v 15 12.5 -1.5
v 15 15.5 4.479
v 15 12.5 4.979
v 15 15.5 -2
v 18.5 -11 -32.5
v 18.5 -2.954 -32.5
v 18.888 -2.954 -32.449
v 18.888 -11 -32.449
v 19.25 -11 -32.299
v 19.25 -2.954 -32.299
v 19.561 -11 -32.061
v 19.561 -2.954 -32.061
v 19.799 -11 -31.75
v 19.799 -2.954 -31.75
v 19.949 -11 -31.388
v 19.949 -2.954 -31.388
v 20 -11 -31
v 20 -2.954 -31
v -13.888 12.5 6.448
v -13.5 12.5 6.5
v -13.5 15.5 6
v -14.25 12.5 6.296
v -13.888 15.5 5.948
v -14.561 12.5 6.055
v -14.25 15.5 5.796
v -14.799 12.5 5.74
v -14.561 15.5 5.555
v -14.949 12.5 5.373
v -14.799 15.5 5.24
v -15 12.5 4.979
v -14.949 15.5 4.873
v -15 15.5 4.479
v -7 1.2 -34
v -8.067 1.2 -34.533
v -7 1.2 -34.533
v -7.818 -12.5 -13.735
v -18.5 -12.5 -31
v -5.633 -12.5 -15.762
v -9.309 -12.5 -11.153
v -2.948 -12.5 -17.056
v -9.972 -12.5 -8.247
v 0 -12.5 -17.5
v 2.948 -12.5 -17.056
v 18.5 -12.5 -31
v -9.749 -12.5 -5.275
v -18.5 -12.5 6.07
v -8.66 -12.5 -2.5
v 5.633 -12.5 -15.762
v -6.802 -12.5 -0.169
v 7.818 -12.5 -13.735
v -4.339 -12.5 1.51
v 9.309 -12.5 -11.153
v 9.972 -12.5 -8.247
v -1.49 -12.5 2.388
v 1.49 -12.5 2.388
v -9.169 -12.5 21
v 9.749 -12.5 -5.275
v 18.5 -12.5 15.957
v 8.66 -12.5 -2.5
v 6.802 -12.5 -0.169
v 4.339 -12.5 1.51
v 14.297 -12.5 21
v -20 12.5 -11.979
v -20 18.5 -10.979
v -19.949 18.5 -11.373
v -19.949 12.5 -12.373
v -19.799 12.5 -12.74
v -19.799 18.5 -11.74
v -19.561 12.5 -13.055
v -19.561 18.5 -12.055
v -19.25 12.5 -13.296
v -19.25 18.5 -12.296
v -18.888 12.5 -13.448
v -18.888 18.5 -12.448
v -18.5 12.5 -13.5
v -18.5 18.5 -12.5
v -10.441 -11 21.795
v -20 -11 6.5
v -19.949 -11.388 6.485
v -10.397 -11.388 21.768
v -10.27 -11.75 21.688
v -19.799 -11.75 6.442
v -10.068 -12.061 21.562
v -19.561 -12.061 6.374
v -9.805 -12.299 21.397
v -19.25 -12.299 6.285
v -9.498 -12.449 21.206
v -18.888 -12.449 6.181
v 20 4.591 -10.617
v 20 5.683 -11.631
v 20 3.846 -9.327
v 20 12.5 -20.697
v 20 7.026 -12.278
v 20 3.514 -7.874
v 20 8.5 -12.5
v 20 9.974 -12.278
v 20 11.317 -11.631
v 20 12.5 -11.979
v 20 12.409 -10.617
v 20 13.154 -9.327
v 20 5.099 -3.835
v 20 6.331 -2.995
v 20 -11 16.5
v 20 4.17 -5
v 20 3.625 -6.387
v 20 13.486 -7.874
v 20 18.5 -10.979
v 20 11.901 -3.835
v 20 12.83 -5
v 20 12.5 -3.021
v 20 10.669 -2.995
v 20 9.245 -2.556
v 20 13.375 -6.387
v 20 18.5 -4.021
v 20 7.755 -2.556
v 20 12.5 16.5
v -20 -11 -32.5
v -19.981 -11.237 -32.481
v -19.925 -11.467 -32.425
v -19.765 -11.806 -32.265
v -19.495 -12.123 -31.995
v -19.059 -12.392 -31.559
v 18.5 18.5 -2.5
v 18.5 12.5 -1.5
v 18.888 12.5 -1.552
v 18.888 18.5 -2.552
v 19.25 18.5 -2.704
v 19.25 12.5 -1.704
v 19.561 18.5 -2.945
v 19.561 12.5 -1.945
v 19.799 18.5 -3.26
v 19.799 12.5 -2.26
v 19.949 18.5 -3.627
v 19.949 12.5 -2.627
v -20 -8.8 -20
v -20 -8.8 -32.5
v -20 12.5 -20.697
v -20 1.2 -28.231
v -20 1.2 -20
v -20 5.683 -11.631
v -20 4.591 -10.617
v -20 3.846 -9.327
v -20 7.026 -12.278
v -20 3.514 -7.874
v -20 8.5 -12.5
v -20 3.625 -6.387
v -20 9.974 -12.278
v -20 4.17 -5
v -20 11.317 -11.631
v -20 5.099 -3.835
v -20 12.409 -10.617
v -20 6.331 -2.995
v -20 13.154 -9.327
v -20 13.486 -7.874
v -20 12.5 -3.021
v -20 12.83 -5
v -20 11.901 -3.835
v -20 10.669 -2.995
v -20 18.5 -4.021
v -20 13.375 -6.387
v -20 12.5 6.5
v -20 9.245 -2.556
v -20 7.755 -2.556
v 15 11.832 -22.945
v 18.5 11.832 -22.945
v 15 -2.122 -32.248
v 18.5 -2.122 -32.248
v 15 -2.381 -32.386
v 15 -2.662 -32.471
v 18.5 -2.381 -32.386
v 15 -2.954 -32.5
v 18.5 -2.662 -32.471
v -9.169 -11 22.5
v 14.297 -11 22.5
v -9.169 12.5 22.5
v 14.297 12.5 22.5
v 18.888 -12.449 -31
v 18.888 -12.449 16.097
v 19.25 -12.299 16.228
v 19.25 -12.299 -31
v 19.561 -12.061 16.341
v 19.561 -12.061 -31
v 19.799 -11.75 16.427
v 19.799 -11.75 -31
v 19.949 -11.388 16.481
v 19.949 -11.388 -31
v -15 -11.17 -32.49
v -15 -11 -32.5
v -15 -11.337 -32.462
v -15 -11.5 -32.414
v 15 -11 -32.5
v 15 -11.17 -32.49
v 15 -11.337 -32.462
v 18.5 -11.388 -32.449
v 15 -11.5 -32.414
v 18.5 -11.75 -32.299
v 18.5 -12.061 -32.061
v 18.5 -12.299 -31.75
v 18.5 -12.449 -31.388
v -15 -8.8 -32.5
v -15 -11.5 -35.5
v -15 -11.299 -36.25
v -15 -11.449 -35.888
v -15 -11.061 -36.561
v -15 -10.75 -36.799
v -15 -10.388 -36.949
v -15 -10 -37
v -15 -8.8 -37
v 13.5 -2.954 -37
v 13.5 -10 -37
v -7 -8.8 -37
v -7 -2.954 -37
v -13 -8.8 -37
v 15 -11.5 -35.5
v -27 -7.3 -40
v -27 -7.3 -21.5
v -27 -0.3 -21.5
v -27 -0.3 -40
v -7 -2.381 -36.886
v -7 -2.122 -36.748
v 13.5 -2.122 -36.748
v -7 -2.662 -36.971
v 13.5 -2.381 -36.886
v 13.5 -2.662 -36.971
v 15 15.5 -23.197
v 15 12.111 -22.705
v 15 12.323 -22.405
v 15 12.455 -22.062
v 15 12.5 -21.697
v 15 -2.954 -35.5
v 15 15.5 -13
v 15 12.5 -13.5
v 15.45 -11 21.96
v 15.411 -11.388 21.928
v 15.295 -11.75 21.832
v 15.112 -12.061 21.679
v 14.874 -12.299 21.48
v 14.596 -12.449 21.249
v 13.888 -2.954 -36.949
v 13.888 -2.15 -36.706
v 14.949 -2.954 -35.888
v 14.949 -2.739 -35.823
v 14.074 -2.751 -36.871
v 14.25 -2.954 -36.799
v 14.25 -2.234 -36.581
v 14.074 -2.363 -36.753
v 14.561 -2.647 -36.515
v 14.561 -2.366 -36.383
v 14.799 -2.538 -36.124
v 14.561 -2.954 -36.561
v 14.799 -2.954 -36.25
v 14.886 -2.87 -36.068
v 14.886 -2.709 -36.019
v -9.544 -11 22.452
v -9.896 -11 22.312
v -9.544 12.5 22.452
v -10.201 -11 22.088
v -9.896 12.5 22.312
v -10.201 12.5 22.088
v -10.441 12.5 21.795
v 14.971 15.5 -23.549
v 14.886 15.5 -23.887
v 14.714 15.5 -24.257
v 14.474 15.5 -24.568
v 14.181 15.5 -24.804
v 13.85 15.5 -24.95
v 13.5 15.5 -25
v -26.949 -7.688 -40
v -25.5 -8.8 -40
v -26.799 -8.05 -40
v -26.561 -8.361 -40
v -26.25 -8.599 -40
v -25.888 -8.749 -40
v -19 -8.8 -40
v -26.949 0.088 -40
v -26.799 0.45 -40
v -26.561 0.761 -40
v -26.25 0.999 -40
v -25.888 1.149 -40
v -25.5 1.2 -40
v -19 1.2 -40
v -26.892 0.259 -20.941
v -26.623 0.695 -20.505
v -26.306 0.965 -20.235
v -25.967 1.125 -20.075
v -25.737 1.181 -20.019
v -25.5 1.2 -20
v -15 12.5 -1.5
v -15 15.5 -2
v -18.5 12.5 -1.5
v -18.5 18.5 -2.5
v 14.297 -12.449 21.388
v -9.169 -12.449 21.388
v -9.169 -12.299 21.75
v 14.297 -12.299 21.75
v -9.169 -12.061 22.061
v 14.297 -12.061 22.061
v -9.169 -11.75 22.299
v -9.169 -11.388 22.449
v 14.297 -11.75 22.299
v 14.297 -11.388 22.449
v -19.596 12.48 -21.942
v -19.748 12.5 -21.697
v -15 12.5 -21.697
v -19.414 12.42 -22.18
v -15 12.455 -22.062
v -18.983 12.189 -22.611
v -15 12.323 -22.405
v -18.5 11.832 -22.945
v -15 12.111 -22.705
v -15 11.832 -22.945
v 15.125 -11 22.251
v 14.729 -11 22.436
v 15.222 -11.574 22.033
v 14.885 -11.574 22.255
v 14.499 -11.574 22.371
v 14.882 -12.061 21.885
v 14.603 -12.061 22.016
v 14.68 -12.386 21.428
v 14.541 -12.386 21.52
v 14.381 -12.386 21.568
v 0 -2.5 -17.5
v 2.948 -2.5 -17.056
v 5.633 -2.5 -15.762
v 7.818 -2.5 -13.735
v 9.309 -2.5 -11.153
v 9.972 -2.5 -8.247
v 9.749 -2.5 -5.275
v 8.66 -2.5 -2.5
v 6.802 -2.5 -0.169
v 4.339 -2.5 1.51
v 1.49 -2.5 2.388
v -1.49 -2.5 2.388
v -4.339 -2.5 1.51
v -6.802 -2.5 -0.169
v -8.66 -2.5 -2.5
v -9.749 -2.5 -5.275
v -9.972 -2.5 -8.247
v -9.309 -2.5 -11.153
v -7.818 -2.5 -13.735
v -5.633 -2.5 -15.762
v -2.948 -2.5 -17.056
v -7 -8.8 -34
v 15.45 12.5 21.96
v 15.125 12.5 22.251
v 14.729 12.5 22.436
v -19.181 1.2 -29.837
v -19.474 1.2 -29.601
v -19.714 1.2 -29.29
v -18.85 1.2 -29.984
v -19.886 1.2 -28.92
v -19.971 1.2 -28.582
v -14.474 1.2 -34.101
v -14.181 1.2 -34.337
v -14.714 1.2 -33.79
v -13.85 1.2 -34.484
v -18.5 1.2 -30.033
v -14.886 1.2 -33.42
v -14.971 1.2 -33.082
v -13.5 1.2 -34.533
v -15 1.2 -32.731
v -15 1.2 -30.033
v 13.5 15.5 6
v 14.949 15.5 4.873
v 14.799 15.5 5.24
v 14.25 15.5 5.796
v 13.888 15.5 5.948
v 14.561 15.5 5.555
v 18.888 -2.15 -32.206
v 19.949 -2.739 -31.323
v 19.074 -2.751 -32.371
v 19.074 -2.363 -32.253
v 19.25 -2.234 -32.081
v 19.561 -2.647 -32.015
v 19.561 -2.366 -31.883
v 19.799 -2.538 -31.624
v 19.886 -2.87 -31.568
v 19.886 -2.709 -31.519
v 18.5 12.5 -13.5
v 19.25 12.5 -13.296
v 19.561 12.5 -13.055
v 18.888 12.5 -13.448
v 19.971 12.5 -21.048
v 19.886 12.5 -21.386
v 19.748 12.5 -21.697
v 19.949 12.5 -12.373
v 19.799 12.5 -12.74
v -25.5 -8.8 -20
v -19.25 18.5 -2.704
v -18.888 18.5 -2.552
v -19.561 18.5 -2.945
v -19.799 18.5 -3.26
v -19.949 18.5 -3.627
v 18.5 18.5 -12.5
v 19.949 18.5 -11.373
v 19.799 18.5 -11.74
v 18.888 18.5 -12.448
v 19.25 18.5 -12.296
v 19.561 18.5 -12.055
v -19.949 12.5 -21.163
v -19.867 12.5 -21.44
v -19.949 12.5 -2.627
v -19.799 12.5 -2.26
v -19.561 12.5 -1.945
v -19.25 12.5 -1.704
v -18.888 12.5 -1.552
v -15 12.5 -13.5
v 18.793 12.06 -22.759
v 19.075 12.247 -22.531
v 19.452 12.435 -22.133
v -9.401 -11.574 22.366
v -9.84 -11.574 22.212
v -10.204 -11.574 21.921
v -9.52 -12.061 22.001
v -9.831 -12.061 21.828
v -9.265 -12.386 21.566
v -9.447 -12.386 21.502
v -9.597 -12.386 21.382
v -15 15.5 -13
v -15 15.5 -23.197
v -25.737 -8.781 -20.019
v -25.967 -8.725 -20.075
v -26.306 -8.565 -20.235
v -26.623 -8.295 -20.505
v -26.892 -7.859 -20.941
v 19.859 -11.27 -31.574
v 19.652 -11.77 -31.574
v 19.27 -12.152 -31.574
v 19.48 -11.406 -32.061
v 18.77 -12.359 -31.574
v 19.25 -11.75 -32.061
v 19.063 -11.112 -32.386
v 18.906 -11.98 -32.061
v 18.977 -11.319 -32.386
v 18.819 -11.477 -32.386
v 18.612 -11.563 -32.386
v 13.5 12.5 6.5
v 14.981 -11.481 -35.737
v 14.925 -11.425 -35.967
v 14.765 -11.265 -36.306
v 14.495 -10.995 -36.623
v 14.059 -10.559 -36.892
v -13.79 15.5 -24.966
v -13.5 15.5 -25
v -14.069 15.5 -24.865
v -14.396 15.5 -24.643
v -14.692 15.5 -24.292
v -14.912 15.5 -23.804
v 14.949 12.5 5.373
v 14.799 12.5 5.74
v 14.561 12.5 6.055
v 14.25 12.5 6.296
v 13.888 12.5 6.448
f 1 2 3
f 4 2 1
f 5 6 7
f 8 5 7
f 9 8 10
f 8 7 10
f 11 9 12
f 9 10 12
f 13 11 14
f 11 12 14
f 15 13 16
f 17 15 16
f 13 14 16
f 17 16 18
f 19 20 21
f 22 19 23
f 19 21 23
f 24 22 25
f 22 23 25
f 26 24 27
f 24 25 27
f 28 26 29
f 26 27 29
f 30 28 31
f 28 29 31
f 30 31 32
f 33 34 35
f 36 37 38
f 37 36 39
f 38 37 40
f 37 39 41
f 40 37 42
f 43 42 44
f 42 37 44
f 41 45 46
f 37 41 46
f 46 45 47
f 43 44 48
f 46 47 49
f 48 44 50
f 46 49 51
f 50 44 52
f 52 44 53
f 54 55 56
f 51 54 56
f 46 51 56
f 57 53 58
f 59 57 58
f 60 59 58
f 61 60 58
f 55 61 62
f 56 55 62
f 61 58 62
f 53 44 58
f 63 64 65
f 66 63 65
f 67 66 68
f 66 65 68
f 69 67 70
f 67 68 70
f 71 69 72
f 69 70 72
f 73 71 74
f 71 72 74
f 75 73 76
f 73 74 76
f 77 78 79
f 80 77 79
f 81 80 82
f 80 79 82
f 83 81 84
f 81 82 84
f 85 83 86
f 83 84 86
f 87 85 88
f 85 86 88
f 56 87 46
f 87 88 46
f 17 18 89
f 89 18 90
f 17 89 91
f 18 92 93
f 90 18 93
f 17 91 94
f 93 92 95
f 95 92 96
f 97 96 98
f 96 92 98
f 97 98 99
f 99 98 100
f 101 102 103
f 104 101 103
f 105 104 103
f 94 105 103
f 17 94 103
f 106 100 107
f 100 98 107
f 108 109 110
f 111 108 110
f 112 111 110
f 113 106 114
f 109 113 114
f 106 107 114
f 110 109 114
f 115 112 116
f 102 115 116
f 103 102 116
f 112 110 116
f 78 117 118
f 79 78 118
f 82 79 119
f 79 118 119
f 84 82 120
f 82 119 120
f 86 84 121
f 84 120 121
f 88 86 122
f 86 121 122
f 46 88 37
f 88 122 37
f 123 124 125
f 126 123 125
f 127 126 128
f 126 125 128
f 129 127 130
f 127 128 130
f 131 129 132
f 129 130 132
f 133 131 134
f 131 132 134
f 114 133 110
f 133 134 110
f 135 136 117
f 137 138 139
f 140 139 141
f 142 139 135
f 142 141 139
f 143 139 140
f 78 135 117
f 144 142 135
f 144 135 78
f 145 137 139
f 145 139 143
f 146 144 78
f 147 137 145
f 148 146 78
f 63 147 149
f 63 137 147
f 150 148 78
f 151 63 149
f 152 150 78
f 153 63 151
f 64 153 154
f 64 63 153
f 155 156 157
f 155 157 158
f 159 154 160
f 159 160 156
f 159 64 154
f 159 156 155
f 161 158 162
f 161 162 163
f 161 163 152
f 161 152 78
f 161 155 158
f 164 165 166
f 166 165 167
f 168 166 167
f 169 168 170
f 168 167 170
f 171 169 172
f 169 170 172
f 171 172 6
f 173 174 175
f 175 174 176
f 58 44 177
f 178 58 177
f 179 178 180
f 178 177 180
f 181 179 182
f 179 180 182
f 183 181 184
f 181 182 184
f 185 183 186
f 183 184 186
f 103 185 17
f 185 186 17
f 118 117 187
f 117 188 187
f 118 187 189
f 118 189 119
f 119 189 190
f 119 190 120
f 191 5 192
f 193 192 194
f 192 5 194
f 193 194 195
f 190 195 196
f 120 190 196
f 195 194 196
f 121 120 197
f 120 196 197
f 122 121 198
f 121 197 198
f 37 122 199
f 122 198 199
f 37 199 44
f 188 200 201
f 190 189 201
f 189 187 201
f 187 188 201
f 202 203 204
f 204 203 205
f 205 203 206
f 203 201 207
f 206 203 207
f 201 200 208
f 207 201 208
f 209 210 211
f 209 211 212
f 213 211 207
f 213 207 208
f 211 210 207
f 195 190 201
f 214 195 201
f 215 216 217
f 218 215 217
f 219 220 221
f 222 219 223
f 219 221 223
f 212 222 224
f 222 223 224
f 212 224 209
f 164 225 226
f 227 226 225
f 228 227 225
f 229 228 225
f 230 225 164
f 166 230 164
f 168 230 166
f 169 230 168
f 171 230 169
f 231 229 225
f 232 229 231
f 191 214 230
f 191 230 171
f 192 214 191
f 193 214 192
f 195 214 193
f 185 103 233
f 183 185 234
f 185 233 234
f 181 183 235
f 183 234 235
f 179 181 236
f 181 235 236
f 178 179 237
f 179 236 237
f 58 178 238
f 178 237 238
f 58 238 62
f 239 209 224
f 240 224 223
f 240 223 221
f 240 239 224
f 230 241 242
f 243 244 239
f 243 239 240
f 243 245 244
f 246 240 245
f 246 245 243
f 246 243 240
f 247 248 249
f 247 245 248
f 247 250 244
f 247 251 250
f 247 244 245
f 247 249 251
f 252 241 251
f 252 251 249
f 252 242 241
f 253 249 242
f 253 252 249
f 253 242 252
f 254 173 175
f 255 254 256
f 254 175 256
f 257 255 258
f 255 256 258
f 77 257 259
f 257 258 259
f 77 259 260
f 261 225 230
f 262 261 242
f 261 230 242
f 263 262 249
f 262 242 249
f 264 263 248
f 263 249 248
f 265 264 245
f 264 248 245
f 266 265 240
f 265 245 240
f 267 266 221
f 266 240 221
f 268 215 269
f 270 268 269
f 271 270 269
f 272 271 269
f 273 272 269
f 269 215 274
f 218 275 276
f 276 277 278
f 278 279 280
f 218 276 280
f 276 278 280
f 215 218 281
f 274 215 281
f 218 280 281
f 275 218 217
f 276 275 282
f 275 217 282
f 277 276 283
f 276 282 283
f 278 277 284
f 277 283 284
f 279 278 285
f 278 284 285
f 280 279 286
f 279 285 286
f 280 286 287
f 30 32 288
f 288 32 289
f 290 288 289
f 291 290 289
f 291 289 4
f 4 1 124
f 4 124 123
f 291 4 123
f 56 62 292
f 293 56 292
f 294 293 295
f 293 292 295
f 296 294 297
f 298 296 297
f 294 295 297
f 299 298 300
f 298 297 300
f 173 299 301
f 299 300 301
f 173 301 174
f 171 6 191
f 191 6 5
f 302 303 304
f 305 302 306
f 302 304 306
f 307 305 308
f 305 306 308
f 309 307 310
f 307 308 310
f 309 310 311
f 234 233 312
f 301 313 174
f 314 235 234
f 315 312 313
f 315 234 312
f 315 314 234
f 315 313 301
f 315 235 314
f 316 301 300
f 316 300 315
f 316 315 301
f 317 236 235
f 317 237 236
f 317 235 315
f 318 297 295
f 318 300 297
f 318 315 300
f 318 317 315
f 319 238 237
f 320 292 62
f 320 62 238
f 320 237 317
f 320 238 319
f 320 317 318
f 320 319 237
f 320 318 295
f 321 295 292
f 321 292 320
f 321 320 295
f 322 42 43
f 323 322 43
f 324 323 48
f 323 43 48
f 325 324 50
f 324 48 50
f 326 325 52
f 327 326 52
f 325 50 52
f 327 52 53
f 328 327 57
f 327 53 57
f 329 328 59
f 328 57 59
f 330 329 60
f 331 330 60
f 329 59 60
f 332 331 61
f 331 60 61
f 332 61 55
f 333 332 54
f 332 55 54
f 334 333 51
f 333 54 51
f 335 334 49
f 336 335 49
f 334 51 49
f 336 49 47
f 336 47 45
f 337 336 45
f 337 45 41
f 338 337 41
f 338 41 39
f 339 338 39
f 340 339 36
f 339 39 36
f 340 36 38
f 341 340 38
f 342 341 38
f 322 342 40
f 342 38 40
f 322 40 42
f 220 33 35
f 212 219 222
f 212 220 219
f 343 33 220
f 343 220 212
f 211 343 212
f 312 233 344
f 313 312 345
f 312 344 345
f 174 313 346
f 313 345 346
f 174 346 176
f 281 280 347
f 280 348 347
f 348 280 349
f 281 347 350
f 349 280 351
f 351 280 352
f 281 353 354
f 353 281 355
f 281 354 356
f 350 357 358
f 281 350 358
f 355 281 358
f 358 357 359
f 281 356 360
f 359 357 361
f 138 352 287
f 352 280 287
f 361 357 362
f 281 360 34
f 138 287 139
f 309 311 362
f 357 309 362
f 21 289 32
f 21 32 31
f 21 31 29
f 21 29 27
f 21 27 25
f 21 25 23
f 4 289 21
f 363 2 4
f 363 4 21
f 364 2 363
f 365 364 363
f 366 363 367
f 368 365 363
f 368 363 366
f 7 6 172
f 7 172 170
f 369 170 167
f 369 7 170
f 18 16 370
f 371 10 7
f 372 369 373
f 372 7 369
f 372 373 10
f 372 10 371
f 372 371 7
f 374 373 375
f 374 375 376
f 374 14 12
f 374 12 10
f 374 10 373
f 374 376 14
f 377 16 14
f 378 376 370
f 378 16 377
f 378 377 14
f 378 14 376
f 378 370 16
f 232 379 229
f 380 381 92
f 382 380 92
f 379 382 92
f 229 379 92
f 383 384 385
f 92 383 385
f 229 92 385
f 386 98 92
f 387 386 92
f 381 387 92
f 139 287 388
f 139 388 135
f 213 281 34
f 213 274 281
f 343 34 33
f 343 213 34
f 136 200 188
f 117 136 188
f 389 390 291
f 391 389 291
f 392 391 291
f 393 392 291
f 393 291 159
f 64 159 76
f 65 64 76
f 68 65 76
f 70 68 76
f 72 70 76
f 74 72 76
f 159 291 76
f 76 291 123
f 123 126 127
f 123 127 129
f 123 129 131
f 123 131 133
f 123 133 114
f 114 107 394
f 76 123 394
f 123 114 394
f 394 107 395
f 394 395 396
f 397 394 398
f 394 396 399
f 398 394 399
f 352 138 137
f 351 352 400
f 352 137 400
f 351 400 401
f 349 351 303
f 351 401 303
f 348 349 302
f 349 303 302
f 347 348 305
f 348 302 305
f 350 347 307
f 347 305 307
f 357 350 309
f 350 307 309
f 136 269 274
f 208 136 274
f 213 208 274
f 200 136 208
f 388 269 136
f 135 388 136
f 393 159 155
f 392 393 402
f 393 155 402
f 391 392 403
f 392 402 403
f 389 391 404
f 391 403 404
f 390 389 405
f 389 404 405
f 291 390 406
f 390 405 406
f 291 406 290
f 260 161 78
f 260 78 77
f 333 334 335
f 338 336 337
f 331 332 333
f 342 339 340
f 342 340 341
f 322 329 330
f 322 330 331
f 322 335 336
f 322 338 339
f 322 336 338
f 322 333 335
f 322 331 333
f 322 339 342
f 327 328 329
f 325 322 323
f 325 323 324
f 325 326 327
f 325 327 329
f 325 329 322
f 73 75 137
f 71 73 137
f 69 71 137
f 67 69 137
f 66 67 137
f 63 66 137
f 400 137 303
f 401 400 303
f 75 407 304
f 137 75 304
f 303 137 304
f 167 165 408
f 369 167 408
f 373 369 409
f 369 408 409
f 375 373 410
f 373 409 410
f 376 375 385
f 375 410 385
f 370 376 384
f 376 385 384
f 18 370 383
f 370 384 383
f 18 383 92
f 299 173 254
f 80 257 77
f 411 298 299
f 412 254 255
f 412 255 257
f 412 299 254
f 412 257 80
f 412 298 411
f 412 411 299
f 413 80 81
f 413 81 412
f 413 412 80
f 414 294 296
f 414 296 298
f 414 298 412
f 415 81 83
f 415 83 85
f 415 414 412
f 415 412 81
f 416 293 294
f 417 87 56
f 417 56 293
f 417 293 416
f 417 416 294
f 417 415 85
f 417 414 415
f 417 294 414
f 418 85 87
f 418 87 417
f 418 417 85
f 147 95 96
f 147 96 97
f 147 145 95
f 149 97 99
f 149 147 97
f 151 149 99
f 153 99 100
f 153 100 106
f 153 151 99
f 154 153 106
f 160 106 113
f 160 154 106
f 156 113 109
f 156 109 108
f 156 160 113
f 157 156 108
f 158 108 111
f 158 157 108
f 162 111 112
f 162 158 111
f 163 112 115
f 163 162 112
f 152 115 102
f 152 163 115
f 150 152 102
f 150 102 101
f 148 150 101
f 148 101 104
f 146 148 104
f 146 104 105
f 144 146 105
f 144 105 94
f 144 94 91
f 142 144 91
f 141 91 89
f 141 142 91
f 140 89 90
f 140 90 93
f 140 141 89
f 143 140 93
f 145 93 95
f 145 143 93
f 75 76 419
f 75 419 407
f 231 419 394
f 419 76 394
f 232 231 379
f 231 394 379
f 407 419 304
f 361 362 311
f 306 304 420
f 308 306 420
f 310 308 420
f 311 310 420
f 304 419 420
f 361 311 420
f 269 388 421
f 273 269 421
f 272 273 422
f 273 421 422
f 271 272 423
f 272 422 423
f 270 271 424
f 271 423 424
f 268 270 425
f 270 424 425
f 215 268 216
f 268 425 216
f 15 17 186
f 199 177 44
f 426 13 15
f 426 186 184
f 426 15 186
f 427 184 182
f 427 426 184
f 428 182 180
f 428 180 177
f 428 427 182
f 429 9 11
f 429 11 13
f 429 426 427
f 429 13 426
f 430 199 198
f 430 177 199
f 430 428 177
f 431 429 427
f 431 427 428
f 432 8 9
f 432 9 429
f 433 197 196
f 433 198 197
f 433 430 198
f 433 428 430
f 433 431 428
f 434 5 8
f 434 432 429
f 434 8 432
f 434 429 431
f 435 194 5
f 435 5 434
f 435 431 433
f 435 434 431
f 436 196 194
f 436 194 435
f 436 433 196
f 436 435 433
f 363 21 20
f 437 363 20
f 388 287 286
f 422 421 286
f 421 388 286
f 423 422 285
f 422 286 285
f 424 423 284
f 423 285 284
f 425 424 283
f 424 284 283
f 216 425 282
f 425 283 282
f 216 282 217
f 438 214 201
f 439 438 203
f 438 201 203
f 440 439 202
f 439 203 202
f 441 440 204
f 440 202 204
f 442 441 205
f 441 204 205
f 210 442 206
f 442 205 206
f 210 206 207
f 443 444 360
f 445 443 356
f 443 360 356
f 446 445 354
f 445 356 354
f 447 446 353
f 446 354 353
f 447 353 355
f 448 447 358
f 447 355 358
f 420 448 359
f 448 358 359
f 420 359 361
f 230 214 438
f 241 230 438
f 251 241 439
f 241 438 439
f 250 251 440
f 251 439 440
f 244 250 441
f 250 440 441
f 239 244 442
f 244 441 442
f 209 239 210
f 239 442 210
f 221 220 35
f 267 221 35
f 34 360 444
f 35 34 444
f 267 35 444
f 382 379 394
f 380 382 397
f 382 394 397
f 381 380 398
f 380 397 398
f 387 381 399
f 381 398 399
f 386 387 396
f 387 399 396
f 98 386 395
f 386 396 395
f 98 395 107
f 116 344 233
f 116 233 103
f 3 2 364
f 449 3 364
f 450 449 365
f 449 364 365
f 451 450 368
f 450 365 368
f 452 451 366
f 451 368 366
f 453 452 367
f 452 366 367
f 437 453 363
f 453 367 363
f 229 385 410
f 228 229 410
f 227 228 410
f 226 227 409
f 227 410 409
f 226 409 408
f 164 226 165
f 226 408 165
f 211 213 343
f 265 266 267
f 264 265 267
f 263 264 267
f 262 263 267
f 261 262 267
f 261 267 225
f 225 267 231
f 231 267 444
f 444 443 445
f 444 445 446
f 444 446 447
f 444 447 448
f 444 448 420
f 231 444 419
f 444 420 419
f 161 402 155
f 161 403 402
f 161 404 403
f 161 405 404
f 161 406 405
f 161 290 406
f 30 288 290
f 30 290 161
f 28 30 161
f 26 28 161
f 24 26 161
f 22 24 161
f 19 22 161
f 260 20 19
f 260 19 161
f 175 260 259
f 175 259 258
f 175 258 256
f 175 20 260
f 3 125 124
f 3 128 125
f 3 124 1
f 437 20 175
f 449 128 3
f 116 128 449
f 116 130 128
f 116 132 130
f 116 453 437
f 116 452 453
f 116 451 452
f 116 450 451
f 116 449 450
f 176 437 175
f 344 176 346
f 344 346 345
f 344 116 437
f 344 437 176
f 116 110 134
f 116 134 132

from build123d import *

# Parameters (mm, degrees)
SKETCH1_R           = 5
BOSS_EXTRUDE1_DEPTH = 20
BOSS_EXTRUDE2_DEPTH = 15
CUT_EXTRUDE2_DEPTH  = 49.928519291
BOSS_EXTRUDE3_START = -20
SKETCH4_W           = 20
SKETCH4_H           = 10
BOSS_EXTRUDE3_DEPTH = 20
CUT_EXTRUDE3_DEPTH  = 5
SKETCH2_R           = 10
CUT_EXTRUDE1_DEPTH  = 10
FILLET1_R           = 1.5


with BuildPart() as part:
    # Sketch1 → Boss-Extrude1 (new, symmetric)
    with BuildSketch(Plane(origin=(0, 0, 0), x_dir=(0, 0, -1), z_dir=(1, 0, 0))):
        Polygon((13.5, 12.5), (22.5, 12.5), (32.5, -2.5), (32.5, -12.5), (-22.5, -12.5), (-22.5, 12.5), (1.5, 12.5), (2.5, 18.5), (12.5, 18.5), align=None)
        with Locations((7.5, 8.5)):
            Circle(SKETCH1_R, mode=Mode.SUBTRACT)
    extrude(amount=BOSS_EXTRUDE1_DEPTH, both=True)

    # Sketch1<3> → Boss-Extrude2 (add, symmetric)
    with BuildSketch(Plane(origin=(0, 0, 0), x_dir=(0, 0, -1), z_dir=(1, 0, 0))):
        Polygon((13.5, 12.5), (22.5, 12.5), (32.5, -2.5), (32.5, -11.5), (37, -11.5), (37, -2.5), (25, 15.5), (13, 15.5), align=None)
        Polygon((1.5, 12.5), (2, 15.5), (-6, 15.5), (-6.5, 12.5), align=None)
    extrude(amount=BOSS_EXTRUDE2_DEPTH, both=True)

    # Sketch3 → Cut-Extrude2 (cut, through all)
    with BuildSketch(Plane(origin=(0, 12.5, 0), x_dir=(1, 0, 0), z_dir=(0, 1, 0))):
        Polygon((15, -22.5), (20, -16.5), (20, -22.5), align=None)
        Polygon((-10, -22.5), (-20, -22.5), (-20, -6.5), align=None)
    extrude(amount=-CUT_EXTRUDE2_DEPTH, mode=Mode.SUBTRACT)

    # Sketch4 → Boss-Extrude3 (add)
    with BuildSketch(Plane.XY.offset(BOSS_EXTRUDE3_START)):
        with Locations((-17, -3.8)):
            Rectangle(SKETCH4_W, SKETCH4_H)
    extrude(amount=-BOSS_EXTRUDE3_DEPTH)

    # Sketch5 → Cut-Extrude3 (cut, symmetric)
    with BuildSketch(Plane(origin=(0, -3.8, 0), x_dir=(-1, 0, 0), z_dir=(0, -1, 0))):
        Polygon((7, 40), (19, 40), (7, 34), align=None)
    extrude(amount=CUT_EXTRUDE3_DEPTH, both=True, mode=Mode.SUBTRACT)

    # Sketch2 → Cut-Extrude1 (cut)
    with BuildSketch(Plane.XZ.offset(12.5)):
        with Locations(Location((0, -7.5, 0), (0, 0, 270))):
            Circle(SKETCH2_R)
    extrude(amount=-CUT_EXTRUDE1_DEPTH, mode=Mode.SUBTRACT)

    # Fillet1
    # the kernel refuses this fillet: 1.5 mm, written as the material it takes off along each edge
    with BuildSketch(Plane(origin=(-9.168628538, -11, 21), x_dir=(0, 0, 1), z_dir=(0, -1, 0))) as fillet1_piece_1_section:
        Polygon((0, 0), (FILLET1_R, 0), (FILLET1_R, FILLET1_R * 0.554247641507), (FILLET1_R * 0.529998940003, FILLET1_R * 0.847998304005), align=None)
    fillet1_piece_1 = extrude(amount=FILLET1_R, mode=Mode.PRIVATE)
    fillet1_piece_1 = fillet1_piece_1 - Plane(origin=(-9.168628538, -11, 21), x_dir=(0.4847685323929452, 0, -0.8746424812468178), z_dir=(0, -1, 0)) * Sphere(FILLET1_R, mode=Mode.PRIVATE)
    add(fillet1_piece_1, mode=Mode.SUBTRACT)
    with BuildSketch(Plane(origin=(18.5, -2.954163457, -31), x_dir=(0, 0, -1), z_dir=(1, 0, 0))) as fillet1_piece_2_section:
        Polygon((0, 0), (FILLET1_R, 0), (FILLET1_R, FILLET1_R * 0.302775637732), (FILLET1_R * 0.832050294338, FILLET1_R * 0.554700196225), align=None)
    fillet1_piece_2 = extrude(amount=FILLET1_R, mode=Mode.PRIVATE)
    fillet1_piece_2 = fillet1_piece_2 - Plane(origin=(18.5, -2.954163457, -31), x_dir=(0, -0.2897841486884299, 0.9570920264890529), z_dir=(1, 0, 0)) * Sphere(FILLET1_R, mode=Mode.PRIVATE)
    add(fillet1_piece_2, mode=Mode.SUBTRACT)
    with BuildSketch(Plane(origin=(18.5, -11, -31), x_dir=(1, 0, 0), z_dir=(0, 0, -1))) as fillet1_piece_3_section:
        Polygon((0, 0), (FILLET1_R, 0), (FILLET1_R, FILLET1_R), (0, FILLET1_R), align=None)
    fillet1_piece_3 = extrude(amount=FILLET1_R, mode=Mode.PRIVATE)
    fillet1_piece_3 = fillet1_piece_3 - Plane(origin=(18.5, -11, -31), x_dir=(-0.7071067811865475, 0.7071067811865475, 0), z_dir=(0, 0, -1)) * Sphere(FILLET1_R, mode=Mode.PRIVATE)
    add(fillet1_piece_3, mode=Mode.SUBTRACT)
    with BuildSketch(Plane(origin=(13.5, -2.954163457, -35.5), x_dir=(0, 0.5547001962252297, -0.8320502943378434), z_dir=(1, 0, 0))) as fillet1_piece_4_section:
        Polygon((0, 0), (FILLET1_R, 0), (FILLET1_R, -FILLET1_R * 0.302775637732), (FILLET1_R * 0.832050294338, -FILLET1_R * 0.554700196225), align=None)
    fillet1_piece_4 = extrude(amount=FILLET1_R, mode=Mode.PRIVATE)
    fillet1_piece_4 = fillet1_piece_4 - Plane(origin=(13.5, -2.954163457, -35.5), x_dir=(0, -0.2897841486884304, 0.9570920264890528), z_dir=(1, 0, 0)) * Sphere(FILLET1_R, mode=Mode.PRIVATE)
    add(fillet1_piece_4, mode=Mode.SUBTRACT)
    with BuildSketch(Plane(origin=(14.297437581, -11, 21), x_dir=(0, 0, 1), z_dir=(0, -1, 0))) as fillet1_piece_5_section:
        Polygon((0, 0), (FILLET1_R, 0), (FILLET1_R, -FILLET1_R * 0.468374945984), (FILLET1_R * 0.640184399664, -FILLET1_R * 0.768221279597), align=None)
    fillet1_piece_5 = extrude(amount=FILLET1_R, mode=Mode.PRIVATE)
    fillet1_piece_5 = fillet1_piece_5 - Plane(origin=(14.297437581, -11, 21), x_dir=(-0.42415539624972376, 0, -0.90558942122368), z_dir=(0, -1, 0)) * Sphere(FILLET1_R, mode=Mode.PRIVATE)
    add(fillet1_piece_5, mode=Mode.SUBTRACT)
    with BuildSketch(Plane(origin=(-10, 14.578428656, 22.5), x_dir=(-0.5299989400031788, 0, -0.8479983040050887), z_dir=(0, -1, 0))) as fillet1_piece_6:
        with BuildLine():
            CenterArc((FILLET1_R * 0.554247641507, FILLET1_R), FILLET1_R, 212.005383208, 57.994616792)
            Line((-FILLET1_R * 0.293750662498, FILLET1_R * 0.470001059997), (0, 0))
            Line((0, 0), (FILLET1_R * 0.554247641507, 0))
        make_face()
    extrude(amount=25.578428656, mode=Mode.SUBTRACT)
    with BuildSketch(Plane(origin=(20, -2.954163457, -32.5), x_dir=(0, 0, 1), z_dir=(0, -1, 0))) as fillet1_piece_7:
        with BuildLine():
            CenterArc((FILLET1_R, FILLET1_R), FILLET1_R, 180, 90)
            Line((0, FILLET1_R), (0, 0))
            Line((0, 0), (FILLET1_R, 0))
        make_face()
    extrude(amount=8.045836543, mode=Mode.SUBTRACT)
    with BuildSketch(Plane(origin=(15, -15.25, -37), x_dir=(0, 0, 1), z_dir=(0, 1, 0))) as fillet1_piece_8:
        with BuildLine():
            CenterArc((FILLET1_R, -FILLET1_R), FILLET1_R, 90, 90)
            Line((0, -FILLET1_R), (0, 0))
            Line((0, 0), (FILLET1_R, 0))
        make_face()
    extrude(amount=12.295836543, mode=Mode.SUBTRACT)
    with BuildSketch(Plane(origin=(13.5, -2.5, -37), x_dir=(0, 0.8320502943378404, 0.5547001962252341), z_dir=(-1, 0, 0))) as fillet1_piece_9:
        with BuildLine():
            CenterArc((FILLET1_R * 0.302775637732, -FILLET1_R), FILLET1_R, 90, 33.690067526)
            Line((-FILLET1_R * 0.251924558493, -FILLET1_R * 0.167949705662), (0, 0))
            Line((0, 0), (FILLET1_R * 0.302775637732, 0))
        make_face()
    extrude(amount=21.635408641, mode=Mode.SUBTRACT)
    with BuildSketch(Plane(origin=(-15, -1.920188604, -36.613459069), x_dir=(0, -0.5547001962252296, 0.8320502943378434), z_dir=(0, 0.8320502943378434, 0.5547001962252297))) as fillet1_piece_10_section:
        with BuildLine():
            CenterArc((FILLET1_R, FILLET1_R), FILLET1_R, 180, 90)
            Line((0, FILLET1_R), (0, 0))
            Line((0, 0), (FILLET1_R, 0))
        make_face()
    fillet1_piece_10 = extrude(amount=24.68646108, mode=Mode.PRIVATE)
    fillet1_piece_10 = split(fillet1_piece_10, bisect_by=Plane(origin=(-14.658418679, 1.2, -28.384678204), z_dir=(0, 1, 0)), keep=Keep.TOP, mode=Mode.PRIVATE)
    add(fillet1_piece_10, mode=Mode.SUBTRACT)
    with BuildSketch(Plane(origin=(15, -2.122113162, -36.748075442), x_dir=(0, -0.5547001962252296, 0.8320502943378433), z_dir=(0, 0.8320502943378434, 0.5547001962252297))) as fillet1_piece_11:
        with BuildLine():
            CenterArc((FILLET1_R, -FILLET1_R), FILLET1_R, 90, 90)
            Line((0, -FILLET1_R), (0, 0))
            Line((0, 0), (FILLET1_R, 0))
        make_face()
    extrude(amount=24.929144196, mode=Mode.SUBTRACT)
    with BuildSketch(Plane(origin=(20, 15.620188604, -20.419874264), x_dir=(0, -0.5547001962252294, 0.8320502943378434), z_dir=(0, -0.8320502943378436, -0.5547001962252295))) as fillet1_piece_12:
        with BuildLine():
            CenterArc((FILLET1_R, FILLET1_R), FILLET1_R, 180, 90)
            Line((0, FILLET1_R), (0, 0))
            Line((0, 0), (FILLET1_R, 0))
        make_face()
    extrude(amount=21.323592921, mode=Mode.SUBTRACT)
    with BuildSketch(Plane(origin=(-20, 15.620188604, -20.419874264), x_dir=(1, 0, 0), z_dir=(0, -0.8320502943378436, -0.5547001962252295))) as fillet1_piece_13_section:
        with BuildLine():
            CenterArc((FILLET1_R, FILLET1_R), FILLET1_R, 180, 90)
            Line((0, FILLET1_R), (0, 0))
            Line((0, 0), (FILLET1_R, 0))
        make_face()
    fillet1_piece_13 = extrude(amount=21.080909804, mode=Mode.PRIVATE)
    fillet1_piece_13 = split(fillet1_piece_13, bisect_by=Plane(origin=(-19.657999481, 1.2, -24.885399818), z_dir=(0, 1, 0)), keep=Keep.TOP, mode=Mode.PRIVATE)
    add(fillet1_piece_13, mode=Mode.SUBTRACT)
    with BuildSketch(Plane(origin=(-15, 12.5, -22.5), x_dir=(0, 0, 1), z_dir=(-1, 0, 0)), Plane(origin=(22.006939094, 12.5, -22.5), x_dir=(0, 0, 1), z_dir=(-1, 0, 0))) as fillet1_piece_14:
        with BuildLine():
            CenterArc((FILLET1_R * 0.535183758488, -FILLET1_R), FILLET1_R, 90, 56.309932474)
            Line((-FILLET1_R * 0.29686653585, -FILLET1_R * 0.445299803775), (0, 0))
            Line((0, 0), (FILLET1_R * 0.535183758488, 0))
        make_face()
    extrude(amount=7.006939094, mode=Mode.SUBTRACT)
    with BuildSketch(Plane(origin=(18.5, -2.5, -32.5), x_dir=(0, -1, 0), z_dir=(-1, 0, 0))) as fillet1_piece_15:
        with BuildLine():
            CenterArc((FILLET1_R * 0.302775637732, FILLET1_R), FILLET1_R, 236.309932474, 33.690067526)
            Line((-FILLET1_R * 0.251924558493, FILLET1_R * 0.167949705662), (0, 0))
            Line((0, 0), (FILLET1_R * 0.302775637732, 0))
        make_face()
    extrude(amount=3.5, mode=Mode.SUBTRACT)
    with BuildSketch(Plane(origin=(15, 14.256406047, 22.5), x_dir=(0.6401843996644804, 0, -0.7682212795973754), z_dir=(0, -1, 0))) as fillet1_piece_16:
        with BuildLine():
            CenterArc((FILLET1_R * 0.468374945984, -FILLET1_R), FILLET1_R, 90, 50.194428908)
            Line((-FILLET1_R * 0.299846333613, -FILLET1_R * 0.359815600336), (0, 0))
            Line((0, 0), (FILLET1_R * 0.468374945984, 0))
        make_face()
    extrude(amount=25.256406047, mode=Mode.SUBTRACT)
    with BuildSketch(Plane(origin=(-27, 4.95, -20), x_dir=(1, 0, 0), z_dir=(0, -1, 0))) as fillet1_piece_17:
        with BuildLine():
            CenterArc((FILLET1_R, -FILLET1_R), FILLET1_R, 90, 90)
            Line((0, -FILLET1_R), (0, 0))
            Line((0, 0), (FILLET1_R, 0))
        make_face()
    extrude(amount=17.5, mode=Mode.SUBTRACT)
    with BuildSketch(Plane(origin=(18.5, -12.5, -32.5), x_dir=(0, 0, 1), z_dir=(-1, 0, 0))) as fillet1_piece_18_section:
        with BuildLine():
            CenterArc((FILLET1_R, FILLET1_R), FILLET1_R, 180, 90)
            Line((0, FILLET1_R), (0, 0))
            Line((0, 0), (FILLET1_R, 0))
        make_face()
    fillet1_piece_18 = extrude(amount=42.25, mode=Mode.PRIVATE)
    fillet1_piece_18 = split(fillet1_piece_18, bisect_by=Plane(origin=(15, -12.205839998, -32.142494848), z_dir=(1, 0, 0)), keep=Keep.TOP, mode=Mode.PRIVATE)
    fillet1_piece_18 = split(fillet1_piece_18, bisect_by=Plane(origin=(16.75, -11.5, -32.142494848), z_dir=(0, -1, 0)), keep=Keep.TOP, mode=Mode.PRIVATE)
    add(fillet1_piece_18, mode=Mode.SUBTRACT)
    with BuildSketch(Plane(origin=(18.5, -12.5, -32.5), x_dir=(0, 0, 1), z_dir=(-1, 0, 0))) as fillet1_piece_19_section:
        with BuildLine():
            CenterArc((FILLET1_R, FILLET1_R), FILLET1_R, 180, 90)
            Line((0, FILLET1_R), (0, 0))
            Line((0, 0), (FILLET1_R, 0))
        make_face()
    fillet1_piece_19 = extrude(amount=42.25, mode=Mode.PRIVATE)
    fillet1_piece_19 = split(fillet1_piece_19, bisect_by=Plane(origin=(15, -11.310985745, -32.495303959), z_dir=(1, 0, 0)), keep=Keep.TOP, mode=Mode.PRIVATE)
    fillet1_piece_19 = split(fillet1_piece_19, bisect_by=Plane(origin=(16.75, -11.5, -32.495303959), z_dir=(0, 1, 0)), keep=Keep.TOP, mode=Mode.PRIVATE)
    add(fillet1_piece_19, mode=Mode.SUBTRACT)
    with BuildSketch(Plane(origin=(18.5, -12.5, -32.5), x_dir=(0, 0, 1), z_dir=(-1, 0, 0))) as fillet1_piece_20_section:
        with BuildLine():
            CenterArc((FILLET1_R, FILLET1_R), FILLET1_R, 180, 90)
            Line((0, FILLET1_R), (0, 0))
            Line((0, 0), (FILLET1_R, 0))
        make_face()
    fillet1_piece_20 = extrude(amount=42.25, mode=Mode.PRIVATE)
    fillet1_piece_20 = split(fillet1_piece_20, bisect_by=Plane(origin=(15, -12.205839998, -32.142494848), z_dir=(-1, 0, 0)), keep=Keep.TOP, mode=Mode.PRIVATE)
    fillet1_piece_20 = split(fillet1_piece_20, bisect_by=Plane(origin=(-15, -12.205839998, -32.142494848), z_dir=(1, 0, 0)), keep=Keep.TOP, mode=Mode.PRIVATE)
    fillet1_piece_20 = split(fillet1_piece_20, bisect_by=Plane(origin=(0, -11.5, -32.142494848), z_dir=(0, -1, 0)), keep=Keep.TOP, mode=Mode.PRIVATE)
    add(fillet1_piece_20, mode=Mode.SUBTRACT)
    with BuildSketch(Plane(origin=(18.5, -12.5, -32.5), x_dir=(0, 0, 1), z_dir=(-1, 0, 0))) as fillet1_piece_21_section:
        with BuildLine():
            CenterArc((FILLET1_R, FILLET1_R), FILLET1_R, 180, 90)
            Line((0, FILLET1_R), (0, 0))
            Line((0, 0), (FILLET1_R, 0))
        make_face()
    fillet1_piece_21 = extrude(amount=42.25, mode=Mode.PRIVATE)
    fillet1_piece_21 = split(fillet1_piece_21, bisect_by=Plane(origin=(-15, -12.205839998, -32.142494848), z_dir=(-1, 0, 0)), keep=Keep.TOP, mode=Mode.PRIVATE)
    fillet1_piece_21 = split(fillet1_piece_21, bisect_by=Plane(origin=(-19.375, -11.5, -32.142494848), z_dir=(0, -1, 0)), keep=Keep.TOP, mode=Mode.PRIVATE)
    add(fillet1_piece_21, mode=Mode.SUBTRACT)
    with BuildSketch(Plane(origin=(18.5, -12.5, -32.5), x_dir=(0, 0, 1), z_dir=(-1, 0, 0))) as fillet1_piece_22_section:
        with BuildLine():
            CenterArc((FILLET1_R, FILLET1_R), FILLET1_R, 180, 90)
            Line((0, FILLET1_R), (0, 0))
            Line((0, 0), (FILLET1_R, 0))
        make_face()
    fillet1_piece_22 = extrude(amount=42.25, mode=Mode.PRIVATE)
    fillet1_piece_22 = split(fillet1_piece_22, bisect_by=Plane(origin=(-15, -11.310985745, -32.495303959), z_dir=(-1, 0, 0)), keep=Keep.TOP, mode=Mode.PRIVATE)
    fillet1_piece_22 = split(fillet1_piece_22, bisect_by=Plane(origin=(-19.375, -11.5, -32.495303959), z_dir=(0, 1, 0)), keep=Keep.TOP, mode=Mode.PRIVATE)
    add(fillet1_piece_22, mode=Mode.SUBTRACT)
    with BuildSketch(Plane(origin=(-20, -12.5, -36.25), x_dir=(0, 1, 0), z_dir=(0, 0, 1))) as fillet1_piece_23:
        with BuildLine():
            CenterArc((FILLET1_R, -FILLET1_R), FILLET1_R, 90, 90)
            Line((0, -FILLET1_R), (0, 0))
            Line((0, 0), (FILLET1_R, 0))
        make_face()
    extrude(amount=46.5, mode=Mode.SUBTRACT)
    with BuildSketch(Plane(origin=(-21.987496025, -12.5, 3.32000636), x_dir=(0, 1, 0), z_dir=(0.52999894000318, 0, 0.847998304005088))) as fillet1_piece_24:
        with BuildLine():
            CenterArc((FILLET1_R, -FILLET1_R), FILLET1_R, 90, 90)
            Line((0, -FILLET1_R), (0, 0))
            Line((0, 0), (FILLET1_R, 0))
        make_face()
    extrude(amount=21.786590802, mode=Mode.SUBTRACT)
    with BuildSketch(Plane(origin=(14.297437581, -12.5, 22.5), x_dir=(0, 0, -1), z_dir=(-1, 0, 0))) as fillet1_piece_25:
        with BuildLine():
            CenterArc((FILLET1_R, -FILLET1_R), FILLET1_R, 90, 90)
            Line((0, -FILLET1_R), (0, 0))
            Line((0, 0), (FILLET1_R, 0))
        make_face()
    extrude(amount=23.466066119, mode=Mode.SUBTRACT)
    with BuildSketch(Plane(origin=(15.4497695, -12.5, 21.960276599), x_dir=(-0.7682212795973761, 0, -0.6401843996644797), z_dir=(0.6401843996644797, 0, -0.7682212795973761))) as fillet1_piece_26:
        with BuildLine():
            CenterArc((FILLET1_R, FILLET1_R), FILLET1_R, 180, 90)
            Line((0, FILLET1_R), (0, 0))
            Line((0, 0), (FILLET1_R, 0))
        make_face()
    extrude(amount=10.857687257, mode=Mode.SUBTRACT)
    with BuildSketch(Plane(origin=(20, -12.5, -31), x_dir=(0, 1, 0), z_dir=(0, 0, 1))) as fillet1_piece_27:
        with BuildLine():
            CenterArc((FILLET1_R, FILLET1_R), FILLET1_R, 180, 90)
            Line((0, FILLET1_R), (0, 0))
            Line((0, 0), (FILLET1_R, 0))
        make_face()
    extrude(amount=51.25, mode=Mode.SUBTRACT)
    with BuildSketch(Plane(origin=(-15, 19.198977214, 5.383503798), x_dir=(0, -0.16439898730535804, -0.9863939238321436), z_dir=(0, -0.9863939238321436, 0.16439898730535804))) as fillet1_piece_28_section:
        with BuildLine():
            CenterArc((FILLET1_R, FILLET1_R), FILLET1_R, 180, 90)
            Line((0, FILLET1_R), (0, 0))
            Line((0, 0), (FILLET1_R, 0))
        make_face()
    fillet1_piece_28 = extrude(amount=10.541381265, mode=Mode.PRIVATE)
    fillet1_piece_28 = split(fillet1_piece_28, bisect_by=Plane(origin=(-14.658878509, 12.5, 5.604715473), z_dir=(0, 1, 0)), keep=Keep.TOP, mode=Mode.PRIVATE)
    add(fillet1_piece_28, mode=Mode.SUBTRACT)
    with BuildSketch(Plane(origin=(15, 19.198977214, 5.383503798), x_dir=(0, -0.16439898730535804, -0.9863939238321436), z_dir=(0, -0.9863939238321436, 0.16439898730535804))) as fillet1_piece_29_section:
        with BuildLine():
            CenterArc((FILLET1_R, -FILLET1_R), FILLET1_R, 90, 90)
            Line((0, -FILLET1_R), (0, 0))
            Line((0, 0), (FILLET1_R, 0))
        make_face()
    fillet1_piece_29 = extrude(amount=10.541381265, mode=Mode.PRIVATE)
    fillet1_piece_29 = split(fillet1_piece_29, bisect_by=Plane(origin=(14.658878509, 12.5, 5.604715473), z_dir=(0, 1, 0)), keep=Keep.TOP, mode=Mode.PRIVATE)
    add(fillet1_piece_29, mode=Mode.SUBTRACT)
    with BuildSketch(Plane(origin=(-20, 22.198977214, -11.883503798), x_dir=(1, 0, 0), z_dir=(0, -0.9863939238321437, -0.1643989873053573))) as fillet1_piece_30_section:
        with BuildLine():
            CenterArc((FILLET1_R, FILLET1_R), FILLET1_R, 180, 90)
            Line((0, FILLET1_R), (0, 0))
            Line((0, 0), (FILLET1_R, 0))
        make_face()
    fillet1_piece_30 = extrude(amount=13.58276253, mode=Mode.PRIVATE)
    fillet1_piece_30 = split(fillet1_piece_30, bisect_by=Plane(origin=(-19.659354127, 12.5, -12.353910306), z_dir=(0, 1, 0)), keep=Keep.TOP, mode=Mode.PRIVATE)
    add(fillet1_piece_30, mode=Mode.SUBTRACT)
    with BuildSketch(Plane(origin=(-20, 8.801022786, -0.883503798), x_dir=(0, -0.16439898730535737, -0.9863939238321437), z_dir=(0, 0.9863939238321437, -0.16439898730535735))) as fillet1_piece_31_section:
        with BuildLine():
            CenterArc((FILLET1_R, -FILLET1_R), FILLET1_R, 90, 90)
            Line((0, -FILLET1_R), (0, 0))
            Line((0, 0), (FILLET1_R, 0))
        make_face()
    fillet1_piece_31 = extrude(amount=13.58276253, mode=Mode.PRIVATE)
    fillet1_piece_31 = split(fillet1_piece_31, bisect_by=Plane(origin=(-19.659354127, 12.5, -2.646089694), z_dir=(0, 1, 0)), keep=Keep.TOP, mode=Mode.PRIVATE)
    add(fillet1_piece_31, mode=Mode.SUBTRACT)
    with BuildSketch(Plane(origin=(20, 8.801022786, -0.883503798), x_dir=(0, -0.16439898730535737, -0.9863939238321437), z_dir=(0, 0.9863939238321437, -0.16439898730535735))) as fillet1_piece_32_section:
        with BuildLine():
            CenterArc((FILLET1_R, FILLET1_R), FILLET1_R, 180, 90)
            Line((0, FILLET1_R), (0, 0))
            Line((0, 0), (FILLET1_R, 0))
        make_face()
    fillet1_piece_32 = extrude(amount=13.58276253, mode=Mode.PRIVATE)
    fillet1_piece_32 = split(fillet1_piece_32, bisect_by=Plane(origin=(19.659354127, 12.5, -2.646089694), z_dir=(0, 1, 0)), keep=Keep.TOP, mode=Mode.PRIVATE)
    add(fillet1_piece_32, mode=Mode.SUBTRACT)
    with BuildSketch(Plane(origin=(20, 22.198977214, -11.883503798), x_dir=(-1, 0, 0), z_dir=(0, -0.9863939238321437, -0.1643989873053573))) as fillet1_piece_33_section:
        with BuildLine():
            CenterArc((FILLET1_R, -FILLET1_R), FILLET1_R, 90, 90)
            Line((0, -FILLET1_R), (0, 0))
            Line((0, 0), (FILLET1_R, 0))
        make_face()
    fillet1_piece_33 = extrude(amount=13.58276253, mode=Mode.PRIVATE)
    fillet1_piece_33 = split(fillet1_piece_33, bisect_by=Plane(origin=(19.659354127, 12.5, -12.353910306), z_dir=(0, 1, 0)), keep=Keep.TOP, mode=Mode.PRIVATE)
    add(fillet1_piece_33, mode=Mode.SUBTRACT)
    with BuildSketch(Plane(origin=(-18.75, -11.5, -37), x_dir=(0, 0, 1), z_dir=(1, 0, 0))) as fillet1_piece_34:
        with BuildLine():
            CenterArc((FILLET1_R, -FILLET1_R), FILLET1_R, 90, 90)
            Line((0, -FILLET1_R), (0, 0))
            Line((0, 0), (FILLET1_R, 0))
        make_face()
    extrude(amount=37.5, mode=Mode.SUBTRACT)
    with BuildSketch(Plane(origin=(-27, -8.8, -16.25), x_dir=(1, 0, 0), z_dir=(0, 0, -1))) as fillet1_piece_35:
        with BuildLine():
            CenterArc((FILLET1_R, -FILLET1_R), FILLET1_R, 90, 90)
            Line((0, -FILLET1_R), (0, 0))
            Line((0, 0), (FILLET1_R, 0))
        make_face()
    extrude(amount=27.5, mode=Mode.SUBTRACT)
    with BuildSketch(Plane(origin=(-27, 1.2, -16.25), x_dir=(1, 0, 0), z_dir=(0, 0, -1))) as fillet1_piece_36:
        with BuildLine():
            CenterArc((FILLET1_R, FILLET1_R), FILLET1_R, 180, 90)
            Line((0, FILLET1_R), (0, 0))
            Line((0, 0), (FILLET1_R, 0))
        make_face()
    extrude(amount=27.5, mode=Mode.SUBTRACT)


solid = part.part
